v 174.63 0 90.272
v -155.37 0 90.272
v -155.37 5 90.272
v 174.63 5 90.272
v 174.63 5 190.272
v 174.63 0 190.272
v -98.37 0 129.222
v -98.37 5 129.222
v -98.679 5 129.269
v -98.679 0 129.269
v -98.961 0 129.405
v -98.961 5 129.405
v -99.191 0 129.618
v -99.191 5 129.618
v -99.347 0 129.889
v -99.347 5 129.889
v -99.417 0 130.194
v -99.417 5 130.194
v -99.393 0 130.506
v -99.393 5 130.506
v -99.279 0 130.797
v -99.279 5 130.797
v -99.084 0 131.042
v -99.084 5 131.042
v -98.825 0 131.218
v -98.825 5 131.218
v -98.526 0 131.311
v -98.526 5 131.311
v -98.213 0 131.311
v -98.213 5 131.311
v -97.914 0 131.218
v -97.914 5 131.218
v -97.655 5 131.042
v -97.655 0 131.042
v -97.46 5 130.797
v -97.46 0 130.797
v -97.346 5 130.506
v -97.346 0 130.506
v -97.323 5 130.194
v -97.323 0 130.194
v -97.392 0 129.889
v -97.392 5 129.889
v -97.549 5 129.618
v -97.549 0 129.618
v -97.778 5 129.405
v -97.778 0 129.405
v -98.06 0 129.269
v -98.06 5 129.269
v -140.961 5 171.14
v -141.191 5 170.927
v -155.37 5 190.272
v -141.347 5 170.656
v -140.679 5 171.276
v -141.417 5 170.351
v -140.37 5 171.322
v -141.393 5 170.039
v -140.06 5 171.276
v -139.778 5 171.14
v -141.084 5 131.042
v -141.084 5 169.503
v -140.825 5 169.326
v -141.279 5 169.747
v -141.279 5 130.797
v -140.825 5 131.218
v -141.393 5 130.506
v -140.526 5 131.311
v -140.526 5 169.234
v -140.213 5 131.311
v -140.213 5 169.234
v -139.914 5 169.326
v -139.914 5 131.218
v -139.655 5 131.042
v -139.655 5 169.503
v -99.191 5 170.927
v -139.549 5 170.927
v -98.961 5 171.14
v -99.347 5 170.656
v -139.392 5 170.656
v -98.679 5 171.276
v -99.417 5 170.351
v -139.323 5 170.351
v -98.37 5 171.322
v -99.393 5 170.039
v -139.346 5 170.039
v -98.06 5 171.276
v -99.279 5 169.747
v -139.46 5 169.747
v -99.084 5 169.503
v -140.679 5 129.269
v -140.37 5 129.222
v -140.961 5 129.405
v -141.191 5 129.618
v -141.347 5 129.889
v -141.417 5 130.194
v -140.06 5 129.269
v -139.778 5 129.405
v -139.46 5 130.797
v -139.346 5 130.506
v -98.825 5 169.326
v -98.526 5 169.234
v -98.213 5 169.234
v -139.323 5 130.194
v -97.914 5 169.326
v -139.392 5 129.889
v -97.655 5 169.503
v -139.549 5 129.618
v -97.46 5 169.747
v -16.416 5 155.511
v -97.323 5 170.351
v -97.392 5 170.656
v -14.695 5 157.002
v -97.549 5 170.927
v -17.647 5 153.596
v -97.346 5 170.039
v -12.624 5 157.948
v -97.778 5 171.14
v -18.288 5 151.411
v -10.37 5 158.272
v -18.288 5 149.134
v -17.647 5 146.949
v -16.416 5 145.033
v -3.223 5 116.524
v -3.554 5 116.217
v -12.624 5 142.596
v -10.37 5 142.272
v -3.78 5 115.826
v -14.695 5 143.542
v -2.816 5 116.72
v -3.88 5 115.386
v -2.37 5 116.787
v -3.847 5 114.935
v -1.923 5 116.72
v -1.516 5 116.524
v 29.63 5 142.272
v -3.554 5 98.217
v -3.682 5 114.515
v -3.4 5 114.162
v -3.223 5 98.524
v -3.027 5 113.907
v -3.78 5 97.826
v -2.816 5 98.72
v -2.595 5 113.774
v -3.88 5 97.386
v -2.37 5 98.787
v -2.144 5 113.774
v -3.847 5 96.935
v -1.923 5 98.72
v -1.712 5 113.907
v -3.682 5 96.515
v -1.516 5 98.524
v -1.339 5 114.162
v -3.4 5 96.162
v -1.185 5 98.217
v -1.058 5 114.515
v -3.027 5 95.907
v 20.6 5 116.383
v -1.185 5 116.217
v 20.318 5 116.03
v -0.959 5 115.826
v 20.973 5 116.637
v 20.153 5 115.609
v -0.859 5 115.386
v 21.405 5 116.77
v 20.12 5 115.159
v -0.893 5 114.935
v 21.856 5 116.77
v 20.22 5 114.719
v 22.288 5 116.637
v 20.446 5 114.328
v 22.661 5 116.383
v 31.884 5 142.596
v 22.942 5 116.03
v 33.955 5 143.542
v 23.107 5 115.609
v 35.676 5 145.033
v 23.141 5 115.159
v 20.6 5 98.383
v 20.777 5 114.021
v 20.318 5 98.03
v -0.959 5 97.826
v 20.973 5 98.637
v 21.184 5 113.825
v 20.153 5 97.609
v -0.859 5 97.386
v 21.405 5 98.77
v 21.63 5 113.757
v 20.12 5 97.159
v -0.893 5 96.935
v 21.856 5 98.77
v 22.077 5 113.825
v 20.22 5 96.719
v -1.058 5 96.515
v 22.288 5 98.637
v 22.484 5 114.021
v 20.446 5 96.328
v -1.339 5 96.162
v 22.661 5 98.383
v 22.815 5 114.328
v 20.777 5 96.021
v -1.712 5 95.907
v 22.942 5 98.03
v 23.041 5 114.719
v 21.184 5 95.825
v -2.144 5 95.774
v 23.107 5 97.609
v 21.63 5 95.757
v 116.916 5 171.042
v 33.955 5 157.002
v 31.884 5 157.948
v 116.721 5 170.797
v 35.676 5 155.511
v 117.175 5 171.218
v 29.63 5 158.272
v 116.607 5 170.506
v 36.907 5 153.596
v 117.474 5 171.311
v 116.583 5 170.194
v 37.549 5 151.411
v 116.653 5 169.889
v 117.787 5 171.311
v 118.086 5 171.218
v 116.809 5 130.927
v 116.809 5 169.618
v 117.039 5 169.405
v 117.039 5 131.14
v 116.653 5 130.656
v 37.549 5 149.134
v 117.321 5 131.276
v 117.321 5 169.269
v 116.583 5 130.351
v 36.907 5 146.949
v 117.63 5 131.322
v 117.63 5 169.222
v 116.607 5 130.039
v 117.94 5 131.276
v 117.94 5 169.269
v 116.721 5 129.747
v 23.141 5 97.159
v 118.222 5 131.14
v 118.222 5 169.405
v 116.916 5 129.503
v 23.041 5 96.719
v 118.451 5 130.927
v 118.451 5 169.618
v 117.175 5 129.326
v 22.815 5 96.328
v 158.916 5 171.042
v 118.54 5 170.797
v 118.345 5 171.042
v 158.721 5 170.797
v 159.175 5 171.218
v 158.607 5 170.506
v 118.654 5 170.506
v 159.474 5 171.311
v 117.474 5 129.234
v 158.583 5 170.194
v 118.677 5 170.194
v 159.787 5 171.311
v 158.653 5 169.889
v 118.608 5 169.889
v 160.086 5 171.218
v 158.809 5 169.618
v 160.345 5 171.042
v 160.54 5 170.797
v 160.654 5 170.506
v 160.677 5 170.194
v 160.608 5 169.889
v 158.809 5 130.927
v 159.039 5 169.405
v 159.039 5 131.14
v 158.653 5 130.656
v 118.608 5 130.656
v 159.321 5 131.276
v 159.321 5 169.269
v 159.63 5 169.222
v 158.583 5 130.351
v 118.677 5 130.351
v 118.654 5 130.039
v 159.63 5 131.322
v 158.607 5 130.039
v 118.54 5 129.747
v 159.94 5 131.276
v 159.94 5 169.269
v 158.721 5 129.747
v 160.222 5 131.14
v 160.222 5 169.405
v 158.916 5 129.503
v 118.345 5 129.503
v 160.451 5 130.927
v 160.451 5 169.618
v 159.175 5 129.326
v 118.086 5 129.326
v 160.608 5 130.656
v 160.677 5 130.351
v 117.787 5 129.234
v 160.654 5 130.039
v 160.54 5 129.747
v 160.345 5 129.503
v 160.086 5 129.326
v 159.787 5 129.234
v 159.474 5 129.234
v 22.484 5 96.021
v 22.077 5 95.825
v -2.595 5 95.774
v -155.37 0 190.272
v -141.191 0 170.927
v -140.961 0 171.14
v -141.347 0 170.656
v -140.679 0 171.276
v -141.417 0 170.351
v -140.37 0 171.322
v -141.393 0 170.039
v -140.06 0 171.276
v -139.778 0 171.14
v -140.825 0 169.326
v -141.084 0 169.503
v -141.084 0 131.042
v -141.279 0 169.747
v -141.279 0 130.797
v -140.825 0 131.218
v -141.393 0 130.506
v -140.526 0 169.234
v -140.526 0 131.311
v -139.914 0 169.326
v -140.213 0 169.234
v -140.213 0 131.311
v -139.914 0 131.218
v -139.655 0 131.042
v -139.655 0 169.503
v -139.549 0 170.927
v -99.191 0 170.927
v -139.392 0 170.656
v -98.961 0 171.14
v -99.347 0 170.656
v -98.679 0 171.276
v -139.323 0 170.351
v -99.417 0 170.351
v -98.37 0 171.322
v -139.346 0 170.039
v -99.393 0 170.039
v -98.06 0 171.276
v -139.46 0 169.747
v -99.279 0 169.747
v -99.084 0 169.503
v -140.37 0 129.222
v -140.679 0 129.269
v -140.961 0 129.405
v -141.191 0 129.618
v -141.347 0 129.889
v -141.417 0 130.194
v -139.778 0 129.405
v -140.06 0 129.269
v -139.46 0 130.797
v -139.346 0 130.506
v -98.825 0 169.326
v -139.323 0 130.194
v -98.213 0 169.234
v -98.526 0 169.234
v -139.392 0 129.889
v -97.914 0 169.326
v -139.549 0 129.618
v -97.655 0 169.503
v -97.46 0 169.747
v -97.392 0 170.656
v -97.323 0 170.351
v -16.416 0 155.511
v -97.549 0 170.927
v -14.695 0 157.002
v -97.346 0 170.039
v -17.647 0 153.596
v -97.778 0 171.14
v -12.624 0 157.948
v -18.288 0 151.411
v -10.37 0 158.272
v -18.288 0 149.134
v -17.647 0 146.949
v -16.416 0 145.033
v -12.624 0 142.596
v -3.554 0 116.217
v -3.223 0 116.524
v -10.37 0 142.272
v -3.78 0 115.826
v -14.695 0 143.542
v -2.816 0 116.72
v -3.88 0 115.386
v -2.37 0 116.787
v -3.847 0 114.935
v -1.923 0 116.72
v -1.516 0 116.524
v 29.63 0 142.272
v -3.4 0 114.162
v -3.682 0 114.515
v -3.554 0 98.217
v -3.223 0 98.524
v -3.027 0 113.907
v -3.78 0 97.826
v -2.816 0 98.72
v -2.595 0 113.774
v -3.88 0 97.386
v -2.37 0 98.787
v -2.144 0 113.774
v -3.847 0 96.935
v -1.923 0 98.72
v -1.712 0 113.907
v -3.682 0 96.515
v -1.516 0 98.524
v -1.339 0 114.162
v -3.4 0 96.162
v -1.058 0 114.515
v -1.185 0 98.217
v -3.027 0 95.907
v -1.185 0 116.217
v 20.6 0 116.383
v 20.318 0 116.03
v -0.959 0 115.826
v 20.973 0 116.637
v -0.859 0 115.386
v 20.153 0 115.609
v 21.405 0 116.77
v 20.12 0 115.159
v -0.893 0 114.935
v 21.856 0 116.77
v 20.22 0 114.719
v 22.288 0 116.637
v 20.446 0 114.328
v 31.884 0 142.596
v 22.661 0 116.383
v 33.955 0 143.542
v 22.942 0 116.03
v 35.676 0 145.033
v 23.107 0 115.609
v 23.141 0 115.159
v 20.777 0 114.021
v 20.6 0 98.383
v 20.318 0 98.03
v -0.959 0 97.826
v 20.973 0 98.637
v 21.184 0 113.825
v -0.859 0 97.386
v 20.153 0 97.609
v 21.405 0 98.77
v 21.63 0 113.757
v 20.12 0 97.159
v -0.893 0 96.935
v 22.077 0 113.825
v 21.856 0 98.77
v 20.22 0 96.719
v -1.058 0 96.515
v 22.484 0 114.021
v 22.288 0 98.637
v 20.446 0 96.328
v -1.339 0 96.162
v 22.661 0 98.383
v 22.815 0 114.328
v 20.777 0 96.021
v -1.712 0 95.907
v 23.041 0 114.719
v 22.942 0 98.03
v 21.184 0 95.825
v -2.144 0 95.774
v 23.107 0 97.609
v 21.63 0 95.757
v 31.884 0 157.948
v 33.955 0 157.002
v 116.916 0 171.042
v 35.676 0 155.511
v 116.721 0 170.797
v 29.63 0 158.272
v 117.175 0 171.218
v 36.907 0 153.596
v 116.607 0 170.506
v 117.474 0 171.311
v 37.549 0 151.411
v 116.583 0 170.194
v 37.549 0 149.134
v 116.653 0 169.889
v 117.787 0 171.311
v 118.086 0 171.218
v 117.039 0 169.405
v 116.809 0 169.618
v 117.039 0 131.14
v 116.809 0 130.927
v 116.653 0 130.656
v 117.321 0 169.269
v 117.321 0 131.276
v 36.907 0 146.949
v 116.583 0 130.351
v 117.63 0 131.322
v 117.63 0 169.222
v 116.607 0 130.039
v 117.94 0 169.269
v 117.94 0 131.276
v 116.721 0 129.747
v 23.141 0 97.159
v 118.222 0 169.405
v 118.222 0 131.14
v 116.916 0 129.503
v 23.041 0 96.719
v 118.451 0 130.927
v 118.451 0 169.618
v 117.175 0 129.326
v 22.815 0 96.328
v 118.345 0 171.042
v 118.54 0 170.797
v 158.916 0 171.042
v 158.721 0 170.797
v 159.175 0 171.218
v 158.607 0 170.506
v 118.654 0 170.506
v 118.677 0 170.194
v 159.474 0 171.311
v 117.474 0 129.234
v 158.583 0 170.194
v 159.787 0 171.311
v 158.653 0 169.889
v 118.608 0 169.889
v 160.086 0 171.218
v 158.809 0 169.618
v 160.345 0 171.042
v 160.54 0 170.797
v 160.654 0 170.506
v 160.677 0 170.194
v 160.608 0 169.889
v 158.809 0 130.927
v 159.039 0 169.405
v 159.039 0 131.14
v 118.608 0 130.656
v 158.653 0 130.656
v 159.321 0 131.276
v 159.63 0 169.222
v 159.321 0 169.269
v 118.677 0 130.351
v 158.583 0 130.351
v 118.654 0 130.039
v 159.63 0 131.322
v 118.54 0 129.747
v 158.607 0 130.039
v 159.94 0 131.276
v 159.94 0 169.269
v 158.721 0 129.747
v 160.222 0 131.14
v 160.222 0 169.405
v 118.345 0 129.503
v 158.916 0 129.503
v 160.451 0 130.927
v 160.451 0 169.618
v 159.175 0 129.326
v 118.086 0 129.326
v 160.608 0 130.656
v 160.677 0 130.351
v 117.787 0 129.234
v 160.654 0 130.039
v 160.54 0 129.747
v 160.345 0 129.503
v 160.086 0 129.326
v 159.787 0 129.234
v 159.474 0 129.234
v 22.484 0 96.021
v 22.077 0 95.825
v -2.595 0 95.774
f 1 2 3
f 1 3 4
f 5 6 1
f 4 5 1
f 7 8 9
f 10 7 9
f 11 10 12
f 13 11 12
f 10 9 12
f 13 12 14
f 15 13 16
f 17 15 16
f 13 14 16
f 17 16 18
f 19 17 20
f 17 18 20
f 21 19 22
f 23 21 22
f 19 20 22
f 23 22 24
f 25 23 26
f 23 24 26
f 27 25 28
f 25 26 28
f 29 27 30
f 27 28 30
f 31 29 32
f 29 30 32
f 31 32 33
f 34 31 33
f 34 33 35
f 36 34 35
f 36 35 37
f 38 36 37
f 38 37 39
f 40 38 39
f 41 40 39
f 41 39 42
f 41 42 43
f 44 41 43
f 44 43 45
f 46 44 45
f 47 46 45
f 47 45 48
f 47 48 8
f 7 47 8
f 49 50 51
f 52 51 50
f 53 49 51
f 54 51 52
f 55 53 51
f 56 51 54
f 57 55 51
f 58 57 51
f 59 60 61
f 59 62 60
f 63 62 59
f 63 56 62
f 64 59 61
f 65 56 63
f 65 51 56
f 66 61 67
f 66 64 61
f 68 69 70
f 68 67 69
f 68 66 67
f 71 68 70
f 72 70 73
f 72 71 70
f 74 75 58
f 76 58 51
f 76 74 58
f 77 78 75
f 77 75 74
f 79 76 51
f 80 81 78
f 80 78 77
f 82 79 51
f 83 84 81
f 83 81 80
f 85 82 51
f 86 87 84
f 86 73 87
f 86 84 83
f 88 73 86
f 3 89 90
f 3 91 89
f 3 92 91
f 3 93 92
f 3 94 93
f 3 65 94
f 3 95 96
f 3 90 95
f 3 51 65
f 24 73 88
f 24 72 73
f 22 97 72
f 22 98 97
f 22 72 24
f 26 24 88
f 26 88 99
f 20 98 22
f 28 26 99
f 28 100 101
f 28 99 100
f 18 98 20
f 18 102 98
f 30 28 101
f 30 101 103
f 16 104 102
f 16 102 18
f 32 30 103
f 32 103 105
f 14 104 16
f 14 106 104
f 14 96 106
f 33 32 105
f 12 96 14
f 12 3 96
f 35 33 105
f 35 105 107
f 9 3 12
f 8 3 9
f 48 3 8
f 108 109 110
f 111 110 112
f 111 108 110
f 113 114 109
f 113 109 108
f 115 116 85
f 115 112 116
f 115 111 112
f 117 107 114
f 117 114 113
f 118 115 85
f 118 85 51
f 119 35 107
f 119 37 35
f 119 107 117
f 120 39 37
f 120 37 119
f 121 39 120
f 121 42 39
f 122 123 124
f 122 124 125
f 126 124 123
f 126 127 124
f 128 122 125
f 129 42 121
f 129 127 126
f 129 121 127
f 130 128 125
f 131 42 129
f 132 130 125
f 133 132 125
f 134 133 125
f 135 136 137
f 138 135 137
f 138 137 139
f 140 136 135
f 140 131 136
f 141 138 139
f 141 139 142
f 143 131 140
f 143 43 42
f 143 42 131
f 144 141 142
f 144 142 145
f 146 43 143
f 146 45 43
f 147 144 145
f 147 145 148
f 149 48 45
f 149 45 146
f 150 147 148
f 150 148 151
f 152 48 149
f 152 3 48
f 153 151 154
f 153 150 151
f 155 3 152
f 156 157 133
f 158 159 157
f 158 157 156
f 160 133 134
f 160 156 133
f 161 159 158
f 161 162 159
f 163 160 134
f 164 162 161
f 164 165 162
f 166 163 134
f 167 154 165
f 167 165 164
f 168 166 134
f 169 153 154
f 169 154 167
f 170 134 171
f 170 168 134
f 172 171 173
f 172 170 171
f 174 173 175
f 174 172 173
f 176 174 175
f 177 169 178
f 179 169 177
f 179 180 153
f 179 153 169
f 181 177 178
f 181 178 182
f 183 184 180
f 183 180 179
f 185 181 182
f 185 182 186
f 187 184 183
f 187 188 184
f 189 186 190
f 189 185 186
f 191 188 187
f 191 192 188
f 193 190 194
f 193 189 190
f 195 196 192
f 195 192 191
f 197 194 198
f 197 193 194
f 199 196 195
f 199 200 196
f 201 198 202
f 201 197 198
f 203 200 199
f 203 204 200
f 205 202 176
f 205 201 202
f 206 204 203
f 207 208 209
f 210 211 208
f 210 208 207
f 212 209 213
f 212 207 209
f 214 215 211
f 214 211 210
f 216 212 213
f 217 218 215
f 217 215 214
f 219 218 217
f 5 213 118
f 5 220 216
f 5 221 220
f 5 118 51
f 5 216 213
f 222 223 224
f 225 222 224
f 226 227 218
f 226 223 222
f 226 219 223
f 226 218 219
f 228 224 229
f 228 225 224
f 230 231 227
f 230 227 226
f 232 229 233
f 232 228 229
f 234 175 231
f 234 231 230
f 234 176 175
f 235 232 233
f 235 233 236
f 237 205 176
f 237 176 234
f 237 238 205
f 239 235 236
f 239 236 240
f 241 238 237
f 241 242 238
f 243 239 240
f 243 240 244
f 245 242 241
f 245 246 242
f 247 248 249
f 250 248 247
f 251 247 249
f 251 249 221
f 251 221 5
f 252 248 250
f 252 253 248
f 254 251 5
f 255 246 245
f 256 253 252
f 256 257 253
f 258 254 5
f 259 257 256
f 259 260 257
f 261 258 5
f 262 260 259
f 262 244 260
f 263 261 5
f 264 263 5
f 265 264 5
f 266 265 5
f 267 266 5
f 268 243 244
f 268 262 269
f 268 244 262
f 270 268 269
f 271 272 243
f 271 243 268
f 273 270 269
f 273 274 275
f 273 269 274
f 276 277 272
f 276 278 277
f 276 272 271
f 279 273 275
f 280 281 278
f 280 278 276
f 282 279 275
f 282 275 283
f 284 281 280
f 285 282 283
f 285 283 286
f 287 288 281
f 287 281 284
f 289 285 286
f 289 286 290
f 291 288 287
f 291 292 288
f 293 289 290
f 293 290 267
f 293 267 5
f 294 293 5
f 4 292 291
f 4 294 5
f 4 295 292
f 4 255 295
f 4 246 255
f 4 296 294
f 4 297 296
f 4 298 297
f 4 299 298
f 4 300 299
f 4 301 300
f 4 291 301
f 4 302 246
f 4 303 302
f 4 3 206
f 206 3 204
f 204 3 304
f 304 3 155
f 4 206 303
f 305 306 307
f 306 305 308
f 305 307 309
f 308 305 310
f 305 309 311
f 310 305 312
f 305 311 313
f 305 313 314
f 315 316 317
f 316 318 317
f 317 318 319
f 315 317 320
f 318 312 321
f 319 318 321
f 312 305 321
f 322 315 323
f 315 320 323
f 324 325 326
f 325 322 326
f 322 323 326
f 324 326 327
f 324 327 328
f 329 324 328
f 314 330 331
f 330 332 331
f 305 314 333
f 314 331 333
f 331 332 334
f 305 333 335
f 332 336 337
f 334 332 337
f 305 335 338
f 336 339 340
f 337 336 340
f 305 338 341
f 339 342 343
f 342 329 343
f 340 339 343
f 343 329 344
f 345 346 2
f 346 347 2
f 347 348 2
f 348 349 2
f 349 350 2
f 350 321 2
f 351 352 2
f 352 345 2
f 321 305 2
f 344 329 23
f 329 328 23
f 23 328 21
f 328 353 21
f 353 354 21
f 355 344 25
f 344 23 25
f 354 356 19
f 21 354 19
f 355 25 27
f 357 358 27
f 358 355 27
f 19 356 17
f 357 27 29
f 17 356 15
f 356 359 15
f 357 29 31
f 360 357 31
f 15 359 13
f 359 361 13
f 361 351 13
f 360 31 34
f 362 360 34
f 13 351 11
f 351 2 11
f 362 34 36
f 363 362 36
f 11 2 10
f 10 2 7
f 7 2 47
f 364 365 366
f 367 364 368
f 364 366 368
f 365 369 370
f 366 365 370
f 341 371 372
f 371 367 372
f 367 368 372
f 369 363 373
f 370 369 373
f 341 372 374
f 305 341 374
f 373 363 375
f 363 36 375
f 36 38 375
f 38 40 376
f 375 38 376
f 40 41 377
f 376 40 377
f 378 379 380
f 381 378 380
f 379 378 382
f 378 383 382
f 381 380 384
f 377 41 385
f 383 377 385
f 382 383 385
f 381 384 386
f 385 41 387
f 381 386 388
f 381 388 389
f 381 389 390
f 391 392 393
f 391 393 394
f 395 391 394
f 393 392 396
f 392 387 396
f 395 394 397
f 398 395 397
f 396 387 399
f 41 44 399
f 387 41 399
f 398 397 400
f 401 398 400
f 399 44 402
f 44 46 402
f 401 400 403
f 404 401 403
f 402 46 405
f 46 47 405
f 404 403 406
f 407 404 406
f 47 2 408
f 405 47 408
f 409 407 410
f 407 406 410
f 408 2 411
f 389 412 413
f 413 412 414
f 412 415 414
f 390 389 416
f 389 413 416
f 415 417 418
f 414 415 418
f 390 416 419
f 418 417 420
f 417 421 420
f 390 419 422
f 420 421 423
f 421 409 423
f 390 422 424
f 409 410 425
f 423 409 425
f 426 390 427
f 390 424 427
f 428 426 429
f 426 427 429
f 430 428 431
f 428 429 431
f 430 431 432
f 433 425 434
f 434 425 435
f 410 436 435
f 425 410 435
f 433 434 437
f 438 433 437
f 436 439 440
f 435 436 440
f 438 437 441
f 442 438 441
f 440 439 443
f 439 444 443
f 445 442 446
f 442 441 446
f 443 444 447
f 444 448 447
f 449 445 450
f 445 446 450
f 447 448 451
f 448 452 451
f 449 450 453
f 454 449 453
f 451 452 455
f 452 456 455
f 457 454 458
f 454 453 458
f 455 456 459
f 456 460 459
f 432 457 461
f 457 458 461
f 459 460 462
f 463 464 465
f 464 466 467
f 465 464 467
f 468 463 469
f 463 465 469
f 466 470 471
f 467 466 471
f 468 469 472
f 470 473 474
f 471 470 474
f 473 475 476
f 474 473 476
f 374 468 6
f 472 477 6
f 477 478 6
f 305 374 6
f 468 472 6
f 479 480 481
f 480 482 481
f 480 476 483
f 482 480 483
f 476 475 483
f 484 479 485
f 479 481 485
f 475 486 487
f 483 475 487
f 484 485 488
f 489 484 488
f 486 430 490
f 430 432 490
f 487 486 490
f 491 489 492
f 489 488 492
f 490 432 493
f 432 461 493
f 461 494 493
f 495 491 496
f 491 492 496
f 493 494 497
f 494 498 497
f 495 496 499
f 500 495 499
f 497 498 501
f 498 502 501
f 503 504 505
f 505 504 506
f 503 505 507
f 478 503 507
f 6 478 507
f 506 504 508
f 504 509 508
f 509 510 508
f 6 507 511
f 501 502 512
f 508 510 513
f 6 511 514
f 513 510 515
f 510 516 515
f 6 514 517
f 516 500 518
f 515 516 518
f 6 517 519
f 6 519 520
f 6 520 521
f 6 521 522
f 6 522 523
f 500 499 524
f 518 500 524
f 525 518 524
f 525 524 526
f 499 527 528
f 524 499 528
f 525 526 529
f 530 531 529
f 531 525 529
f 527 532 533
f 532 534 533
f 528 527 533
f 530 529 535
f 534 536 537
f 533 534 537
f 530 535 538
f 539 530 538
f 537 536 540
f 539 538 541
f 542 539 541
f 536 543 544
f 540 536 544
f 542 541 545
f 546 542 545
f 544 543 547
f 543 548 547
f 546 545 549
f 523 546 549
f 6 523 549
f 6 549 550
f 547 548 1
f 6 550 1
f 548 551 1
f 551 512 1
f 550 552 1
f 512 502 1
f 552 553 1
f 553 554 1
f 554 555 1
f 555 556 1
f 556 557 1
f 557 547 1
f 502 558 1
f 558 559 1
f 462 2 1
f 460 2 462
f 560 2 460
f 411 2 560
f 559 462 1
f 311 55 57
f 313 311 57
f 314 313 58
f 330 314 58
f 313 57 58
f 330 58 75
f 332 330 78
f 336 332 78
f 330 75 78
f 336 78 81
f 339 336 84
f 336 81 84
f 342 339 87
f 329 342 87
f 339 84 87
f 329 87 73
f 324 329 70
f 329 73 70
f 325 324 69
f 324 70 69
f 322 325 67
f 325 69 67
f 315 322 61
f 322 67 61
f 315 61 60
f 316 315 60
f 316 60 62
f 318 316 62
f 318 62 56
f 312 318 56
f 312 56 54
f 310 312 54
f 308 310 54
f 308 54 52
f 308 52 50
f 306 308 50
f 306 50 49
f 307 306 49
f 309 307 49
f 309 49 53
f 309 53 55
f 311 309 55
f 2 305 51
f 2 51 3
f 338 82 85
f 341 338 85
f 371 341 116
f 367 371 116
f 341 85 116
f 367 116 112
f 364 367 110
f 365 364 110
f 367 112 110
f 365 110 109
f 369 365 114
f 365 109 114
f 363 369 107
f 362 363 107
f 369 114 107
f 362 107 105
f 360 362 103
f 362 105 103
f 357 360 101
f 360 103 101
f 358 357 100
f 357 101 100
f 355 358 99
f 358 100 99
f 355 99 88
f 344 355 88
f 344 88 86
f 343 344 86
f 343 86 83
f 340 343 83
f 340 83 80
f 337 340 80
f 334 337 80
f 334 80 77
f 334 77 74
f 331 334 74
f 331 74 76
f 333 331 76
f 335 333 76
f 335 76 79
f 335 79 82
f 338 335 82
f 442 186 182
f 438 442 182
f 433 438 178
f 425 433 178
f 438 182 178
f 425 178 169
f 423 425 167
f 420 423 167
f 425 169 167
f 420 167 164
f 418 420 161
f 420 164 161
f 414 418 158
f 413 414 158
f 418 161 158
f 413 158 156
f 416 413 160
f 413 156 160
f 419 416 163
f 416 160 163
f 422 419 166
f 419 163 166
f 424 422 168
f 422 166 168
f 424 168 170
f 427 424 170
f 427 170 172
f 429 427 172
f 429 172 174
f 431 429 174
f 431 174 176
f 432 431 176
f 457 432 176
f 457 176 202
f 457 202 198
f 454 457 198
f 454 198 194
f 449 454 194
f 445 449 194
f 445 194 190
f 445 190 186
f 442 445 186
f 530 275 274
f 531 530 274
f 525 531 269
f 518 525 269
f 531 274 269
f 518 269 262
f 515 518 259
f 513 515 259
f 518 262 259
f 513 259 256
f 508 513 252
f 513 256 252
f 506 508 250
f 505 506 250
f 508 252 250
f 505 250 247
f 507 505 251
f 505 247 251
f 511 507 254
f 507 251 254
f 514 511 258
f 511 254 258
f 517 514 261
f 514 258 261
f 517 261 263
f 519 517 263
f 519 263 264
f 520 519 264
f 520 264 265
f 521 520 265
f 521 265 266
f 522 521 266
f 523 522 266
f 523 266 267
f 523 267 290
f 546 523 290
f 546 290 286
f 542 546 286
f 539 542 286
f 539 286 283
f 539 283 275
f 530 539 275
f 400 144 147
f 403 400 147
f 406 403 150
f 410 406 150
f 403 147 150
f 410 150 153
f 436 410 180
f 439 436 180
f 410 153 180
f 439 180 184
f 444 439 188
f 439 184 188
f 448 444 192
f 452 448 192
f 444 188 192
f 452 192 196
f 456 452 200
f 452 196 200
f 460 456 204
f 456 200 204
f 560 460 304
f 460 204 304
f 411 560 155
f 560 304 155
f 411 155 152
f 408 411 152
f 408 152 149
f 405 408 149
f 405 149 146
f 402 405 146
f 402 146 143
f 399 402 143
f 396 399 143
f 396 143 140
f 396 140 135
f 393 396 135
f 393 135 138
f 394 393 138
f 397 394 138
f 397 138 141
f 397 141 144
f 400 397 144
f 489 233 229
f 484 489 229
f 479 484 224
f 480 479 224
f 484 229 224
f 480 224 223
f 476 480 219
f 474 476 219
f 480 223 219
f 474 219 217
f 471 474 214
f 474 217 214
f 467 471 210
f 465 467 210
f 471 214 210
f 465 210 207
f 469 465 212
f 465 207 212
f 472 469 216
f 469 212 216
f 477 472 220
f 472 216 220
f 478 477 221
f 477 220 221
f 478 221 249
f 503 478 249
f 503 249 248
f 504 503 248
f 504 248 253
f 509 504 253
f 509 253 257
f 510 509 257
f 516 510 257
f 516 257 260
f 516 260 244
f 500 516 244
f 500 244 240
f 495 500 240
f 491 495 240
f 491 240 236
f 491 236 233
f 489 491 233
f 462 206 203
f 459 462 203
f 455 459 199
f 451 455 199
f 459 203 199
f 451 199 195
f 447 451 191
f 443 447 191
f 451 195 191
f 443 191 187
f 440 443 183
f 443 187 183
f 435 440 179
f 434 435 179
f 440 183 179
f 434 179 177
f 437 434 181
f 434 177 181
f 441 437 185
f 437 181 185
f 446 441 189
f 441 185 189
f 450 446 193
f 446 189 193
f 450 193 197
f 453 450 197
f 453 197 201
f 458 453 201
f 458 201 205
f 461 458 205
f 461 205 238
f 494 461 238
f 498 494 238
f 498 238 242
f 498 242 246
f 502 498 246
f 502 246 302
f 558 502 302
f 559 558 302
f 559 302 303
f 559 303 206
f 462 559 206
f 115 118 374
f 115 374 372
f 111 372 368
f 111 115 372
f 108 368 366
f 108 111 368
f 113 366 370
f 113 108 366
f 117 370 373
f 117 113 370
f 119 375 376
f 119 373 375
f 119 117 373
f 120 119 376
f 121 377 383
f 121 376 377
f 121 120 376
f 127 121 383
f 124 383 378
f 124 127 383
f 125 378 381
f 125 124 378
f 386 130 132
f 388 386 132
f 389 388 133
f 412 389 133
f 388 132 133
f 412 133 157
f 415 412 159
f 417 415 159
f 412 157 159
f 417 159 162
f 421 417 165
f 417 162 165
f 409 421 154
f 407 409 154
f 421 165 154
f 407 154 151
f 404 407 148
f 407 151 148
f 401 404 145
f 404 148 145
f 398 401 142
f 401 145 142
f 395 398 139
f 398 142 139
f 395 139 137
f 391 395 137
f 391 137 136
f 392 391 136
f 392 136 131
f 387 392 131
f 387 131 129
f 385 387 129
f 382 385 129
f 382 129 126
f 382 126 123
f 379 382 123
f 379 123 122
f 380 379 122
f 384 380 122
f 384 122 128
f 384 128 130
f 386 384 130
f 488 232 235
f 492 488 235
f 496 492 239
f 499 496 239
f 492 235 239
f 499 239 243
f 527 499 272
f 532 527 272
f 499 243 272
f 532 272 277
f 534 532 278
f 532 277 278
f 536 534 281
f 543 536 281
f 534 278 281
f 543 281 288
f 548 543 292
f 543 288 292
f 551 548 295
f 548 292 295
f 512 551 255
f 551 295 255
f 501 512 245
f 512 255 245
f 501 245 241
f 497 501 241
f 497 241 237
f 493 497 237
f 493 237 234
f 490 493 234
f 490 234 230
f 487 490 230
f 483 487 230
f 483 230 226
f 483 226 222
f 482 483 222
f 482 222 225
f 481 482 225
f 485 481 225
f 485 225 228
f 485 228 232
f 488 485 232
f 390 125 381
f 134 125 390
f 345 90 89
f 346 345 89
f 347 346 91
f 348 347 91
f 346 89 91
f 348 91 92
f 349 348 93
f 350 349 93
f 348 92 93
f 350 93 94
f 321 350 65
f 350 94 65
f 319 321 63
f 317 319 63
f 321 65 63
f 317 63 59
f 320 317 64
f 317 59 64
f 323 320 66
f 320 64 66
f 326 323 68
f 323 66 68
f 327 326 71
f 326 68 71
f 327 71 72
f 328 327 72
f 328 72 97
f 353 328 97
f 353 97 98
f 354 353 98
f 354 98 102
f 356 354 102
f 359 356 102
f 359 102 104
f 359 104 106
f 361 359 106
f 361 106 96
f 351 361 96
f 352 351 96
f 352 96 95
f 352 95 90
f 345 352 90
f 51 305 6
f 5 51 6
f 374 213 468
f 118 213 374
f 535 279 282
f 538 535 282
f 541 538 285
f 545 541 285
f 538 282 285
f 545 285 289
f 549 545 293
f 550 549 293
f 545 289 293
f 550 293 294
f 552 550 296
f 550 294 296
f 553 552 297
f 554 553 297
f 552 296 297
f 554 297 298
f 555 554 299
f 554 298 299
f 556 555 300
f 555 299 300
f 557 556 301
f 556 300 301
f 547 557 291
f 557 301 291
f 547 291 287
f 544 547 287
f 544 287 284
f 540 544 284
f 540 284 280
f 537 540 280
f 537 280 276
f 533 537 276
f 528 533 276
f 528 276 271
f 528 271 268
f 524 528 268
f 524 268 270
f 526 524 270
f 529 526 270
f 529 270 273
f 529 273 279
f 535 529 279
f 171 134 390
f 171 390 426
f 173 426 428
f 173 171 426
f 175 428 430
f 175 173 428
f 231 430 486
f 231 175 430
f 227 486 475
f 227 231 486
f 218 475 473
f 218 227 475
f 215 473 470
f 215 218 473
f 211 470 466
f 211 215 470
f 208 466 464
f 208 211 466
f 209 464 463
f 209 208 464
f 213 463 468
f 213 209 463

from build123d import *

# Parameters (mm, degrees)
SKETCH_1_W          = 330
SKETCH_1_H          = 100
EXTRUDE_1_DEPTH     = 5
SKETCH_3_R          = 1.515
CUT_EXTRUDE_1_DEPTH = 259.310540517
SKETCH_4_R          = 1.05
CUT_EXTRUDE_2_DEPTH = 259.310540517


with BuildPart() as part:
    # 草图1 → 凸台-拉伸1 (new body)
    with BuildSketch(Plane(origin=(0, 0, 0), x_dir=(1, 0, 0), z_dir=(0, 1, 0))):
        with Locations((9.630350195, -140.272373541)):
            Rectangle(SKETCH_1_W, SKETCH_1_H)
    extrude(amount=EXTRUDE_1_DEPTH)

    # 草图3 → 切除-拉伸1 (cut, through all)
    with BuildSketch(Plane(origin=(0, 5, 0), x_dir=(1, 0, 0), z_dir=(0, 1, 0))):
        with Locations(Location((-2.369649805, -97.272373541, 0), (0, 0, 270))):
            Circle(SKETCH_3_R)
        with Locations(Location((21.630350195, -97.272373541, 0), (0, 0, 90))):
            Circle(SKETCH_3_R)
        with Locations(Location((-2.369649805, -115.272373541, 0), (0, 0, 270))):
            Circle(SKETCH_3_R)
        with Locations(Location((21.630350195, -115.272373541, 0), (0, 0, 90))):
            Circle(SKETCH_3_R)
    extrude(amount=-CUT_EXTRUDE_1_DEPTH, mode=Mode.SUBTRACT)

    # 草图4 → 切除-拉伸2 (cut, through all)
    with BuildSketch(Plane(origin=(0, 5, 0), x_dir=(1, 0, 0), z_dir=(0, 1, 0))):
        with Locations(Location((-140.369649805, -170.272373541, 0), (0, 0, 270))):
            Circle(SKETCH_4_R)
        with Locations(Location((-140.369649805, -130.272373541, 0), (0, 0, 90))):
            Circle(SKETCH_4_R)
        with Locations(Location((-98.369649805, -170.272373541, 0), (0, 0, 270))):
            Circle(SKETCH_4_R)
        with Locations(Location((-98.369649805, -130.272373541, 0), (0, 0, 90))):
            Circle(SKETCH_4_R)
        with Locations(Location((117.630350195, -130.272373541, 0), (0, 0, 270))):
            Circle(SKETCH_4_R)
        with Locations(Location((117.630350195, -170.272373541, 0), (0, 0, 90))):
            Circle(SKETCH_4_R)
        with Locations(Location((159.630350195, -130.272373541, 0), (0, 0, 270))):
            Circle(SKETCH_4_R)
        with Locations(Location((159.630350195, -170.272373541, 0), (0, 0, 90))):
            Circle(SKETCH_4_R)
        with BuildLine():
            Line((-10.369649805, -142.272373541), (29.630350195, -142.272373541))
            ThreePointArc((29.630350195, -142.272373541), (37.630350195, -150.272373541), (29.630350195, -158.272373541))
            Line((29.630350195, -158.272373541), (-10.369649805, -158.272373541))
            ThreePointArc((-10.369649805, -158.272373541), (-18.369649805, -150.272373541), (-10.369649805, -142.272373541))
        make_face()
    extrude(amount=-CUT_EXTRUDE_2_DEPTH, mode=Mode.SUBTRACT)


solid = part.part
